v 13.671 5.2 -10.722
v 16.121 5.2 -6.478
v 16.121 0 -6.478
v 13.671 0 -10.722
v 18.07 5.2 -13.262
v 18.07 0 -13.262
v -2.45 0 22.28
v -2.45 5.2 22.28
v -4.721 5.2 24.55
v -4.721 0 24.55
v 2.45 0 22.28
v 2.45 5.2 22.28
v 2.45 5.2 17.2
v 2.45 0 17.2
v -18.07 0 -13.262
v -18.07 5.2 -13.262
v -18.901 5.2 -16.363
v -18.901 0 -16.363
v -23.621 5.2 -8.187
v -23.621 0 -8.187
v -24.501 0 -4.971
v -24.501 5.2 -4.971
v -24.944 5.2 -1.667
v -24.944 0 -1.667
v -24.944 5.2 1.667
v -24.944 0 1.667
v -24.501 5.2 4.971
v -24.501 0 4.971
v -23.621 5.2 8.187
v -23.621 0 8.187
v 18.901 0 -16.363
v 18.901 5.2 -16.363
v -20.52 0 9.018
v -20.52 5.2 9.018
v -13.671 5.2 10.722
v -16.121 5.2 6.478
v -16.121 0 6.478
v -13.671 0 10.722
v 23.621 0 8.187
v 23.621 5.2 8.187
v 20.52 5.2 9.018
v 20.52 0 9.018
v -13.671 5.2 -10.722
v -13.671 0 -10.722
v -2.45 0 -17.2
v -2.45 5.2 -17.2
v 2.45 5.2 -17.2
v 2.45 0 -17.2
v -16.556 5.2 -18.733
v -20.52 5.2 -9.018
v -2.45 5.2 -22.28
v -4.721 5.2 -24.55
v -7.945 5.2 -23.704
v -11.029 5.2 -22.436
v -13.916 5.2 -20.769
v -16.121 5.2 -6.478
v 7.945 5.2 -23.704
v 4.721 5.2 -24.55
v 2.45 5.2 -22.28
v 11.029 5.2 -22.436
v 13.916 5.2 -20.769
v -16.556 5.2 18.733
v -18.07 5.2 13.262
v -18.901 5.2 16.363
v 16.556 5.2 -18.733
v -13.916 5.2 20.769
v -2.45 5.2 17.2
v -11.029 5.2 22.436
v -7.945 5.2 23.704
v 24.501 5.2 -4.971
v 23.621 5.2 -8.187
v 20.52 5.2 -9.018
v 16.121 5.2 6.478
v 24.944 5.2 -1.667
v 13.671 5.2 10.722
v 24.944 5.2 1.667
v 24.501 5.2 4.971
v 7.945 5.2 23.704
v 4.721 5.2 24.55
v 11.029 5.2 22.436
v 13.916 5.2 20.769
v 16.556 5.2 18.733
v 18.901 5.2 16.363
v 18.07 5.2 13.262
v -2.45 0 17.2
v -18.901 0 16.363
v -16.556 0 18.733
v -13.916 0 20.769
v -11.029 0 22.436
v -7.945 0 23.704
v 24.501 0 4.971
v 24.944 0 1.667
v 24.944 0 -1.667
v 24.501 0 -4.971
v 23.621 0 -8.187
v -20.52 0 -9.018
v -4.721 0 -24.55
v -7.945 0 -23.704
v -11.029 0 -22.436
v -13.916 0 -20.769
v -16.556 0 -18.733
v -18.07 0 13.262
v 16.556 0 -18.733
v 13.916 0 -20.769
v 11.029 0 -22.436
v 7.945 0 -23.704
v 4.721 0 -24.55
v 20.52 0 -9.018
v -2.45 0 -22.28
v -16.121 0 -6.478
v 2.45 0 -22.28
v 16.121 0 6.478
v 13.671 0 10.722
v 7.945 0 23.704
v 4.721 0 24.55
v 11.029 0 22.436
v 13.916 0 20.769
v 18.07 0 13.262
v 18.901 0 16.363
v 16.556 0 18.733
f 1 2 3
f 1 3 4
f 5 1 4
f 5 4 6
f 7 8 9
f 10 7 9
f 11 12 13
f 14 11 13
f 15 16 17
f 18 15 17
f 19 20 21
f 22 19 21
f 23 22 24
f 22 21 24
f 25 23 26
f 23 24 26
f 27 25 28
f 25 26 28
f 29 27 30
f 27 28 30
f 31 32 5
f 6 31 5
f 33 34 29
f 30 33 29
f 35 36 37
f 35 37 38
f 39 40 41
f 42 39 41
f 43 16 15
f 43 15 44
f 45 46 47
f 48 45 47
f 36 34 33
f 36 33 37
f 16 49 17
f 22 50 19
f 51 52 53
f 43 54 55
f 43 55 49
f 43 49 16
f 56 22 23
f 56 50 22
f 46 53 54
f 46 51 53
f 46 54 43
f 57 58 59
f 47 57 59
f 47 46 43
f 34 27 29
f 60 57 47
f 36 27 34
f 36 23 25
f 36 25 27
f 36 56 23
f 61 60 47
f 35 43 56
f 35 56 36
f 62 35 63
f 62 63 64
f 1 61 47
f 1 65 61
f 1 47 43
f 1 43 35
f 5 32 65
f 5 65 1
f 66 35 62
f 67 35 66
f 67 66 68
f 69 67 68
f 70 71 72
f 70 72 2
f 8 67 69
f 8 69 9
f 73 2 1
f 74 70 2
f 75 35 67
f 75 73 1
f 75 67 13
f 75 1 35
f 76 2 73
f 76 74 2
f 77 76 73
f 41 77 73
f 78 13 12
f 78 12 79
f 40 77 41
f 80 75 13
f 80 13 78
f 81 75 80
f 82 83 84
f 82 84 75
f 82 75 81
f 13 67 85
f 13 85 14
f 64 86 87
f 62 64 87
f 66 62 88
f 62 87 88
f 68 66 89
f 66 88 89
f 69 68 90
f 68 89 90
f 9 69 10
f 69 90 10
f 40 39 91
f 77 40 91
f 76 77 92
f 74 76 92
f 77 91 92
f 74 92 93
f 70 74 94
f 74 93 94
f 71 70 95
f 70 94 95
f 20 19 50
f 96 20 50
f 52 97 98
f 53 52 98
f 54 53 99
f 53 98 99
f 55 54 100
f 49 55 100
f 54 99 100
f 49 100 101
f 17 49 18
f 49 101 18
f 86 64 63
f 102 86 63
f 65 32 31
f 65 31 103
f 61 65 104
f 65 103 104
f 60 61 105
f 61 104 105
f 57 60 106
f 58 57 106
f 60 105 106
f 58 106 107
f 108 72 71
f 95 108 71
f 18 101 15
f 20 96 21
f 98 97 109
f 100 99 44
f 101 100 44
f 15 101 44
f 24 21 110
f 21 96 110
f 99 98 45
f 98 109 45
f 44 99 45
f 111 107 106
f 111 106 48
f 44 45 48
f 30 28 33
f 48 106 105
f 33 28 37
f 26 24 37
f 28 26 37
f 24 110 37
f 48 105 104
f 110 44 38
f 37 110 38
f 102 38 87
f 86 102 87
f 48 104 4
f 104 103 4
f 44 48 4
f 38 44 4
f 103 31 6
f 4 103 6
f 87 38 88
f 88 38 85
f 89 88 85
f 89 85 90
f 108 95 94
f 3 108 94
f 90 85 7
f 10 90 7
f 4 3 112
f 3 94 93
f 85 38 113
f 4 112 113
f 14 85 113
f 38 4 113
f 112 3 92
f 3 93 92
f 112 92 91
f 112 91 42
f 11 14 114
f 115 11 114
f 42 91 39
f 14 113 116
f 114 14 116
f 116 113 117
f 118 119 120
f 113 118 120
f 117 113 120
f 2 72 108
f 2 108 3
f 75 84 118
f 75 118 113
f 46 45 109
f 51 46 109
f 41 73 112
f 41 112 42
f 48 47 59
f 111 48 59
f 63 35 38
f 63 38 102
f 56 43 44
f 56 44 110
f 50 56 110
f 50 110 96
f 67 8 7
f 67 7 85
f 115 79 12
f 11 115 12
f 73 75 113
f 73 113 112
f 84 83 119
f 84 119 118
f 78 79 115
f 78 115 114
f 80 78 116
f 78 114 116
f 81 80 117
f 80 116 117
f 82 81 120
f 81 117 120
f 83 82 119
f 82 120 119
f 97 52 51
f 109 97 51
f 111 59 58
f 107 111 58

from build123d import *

# Parameters (mm, degrees)
SKETCH1_R           = 25
BOSS_EXTRUDE1_DEPTH = 5.2
SKETCH2_W           = 4.9
SKETCH2_H           = 7.8
CUT_EXTRUDE1_DEPTH  = 5.2
CHAMFER1_SIZE       = 2.6


with BuildPart() as part:
    # Sketch1 → Boss-Extrude1 (new body)
    with BuildSketch(Plane(origin=(0, 0, 0), x_dir=(1, 0, 0), z_dir=(0, 1, 0))):
        with Locations(Location((0, 0, 0), (0, 0, 270))):
            Circle(SKETCH1_R)
    extrude(amount=BOSS_EXTRUDE1_DEPTH)

    # Sketch2 → Cut-Extrude1 (cut)
    with BuildSketch(Plane(origin=(0, 5.2, 0), x_dir=(1, 0, 0), z_dir=(0, 1, 0))):
        Polygon((22.875635095, 10.378237761), (16.120636945, 6.478237761), (13.670636945, 10.721762239), (20.425635095, 14.621762239), align=None)
        with Locations((0, 21.1)):
            Rectangle(SKETCH2_W, SKETCH2_H)
        Polygon((20.425635095, -14.621762239), (13.670636945, -10.721762239), (16.120636945, -6.478237761), (22.875635095, -10.378237761), align=None)
        with Locations((0, -21.1)):
            Rectangle(SKETCH2_W, SKETCH2_H)
        Polygon((-22.875635095, -10.378237761), (-16.120636945, -6.478237761), (-13.670636945, -10.721762239), (-20.425635095, -14.621762239), align=None)
        Polygon((-20.425635095, 14.621762239), (-13.670636945, 10.721762239), (-16.120636945, 6.478237761), (-22.875635095, 10.378237761), align=None)
    extrude(amount=-CUT_EXTRUDE1_DEPTH, mode=Mode.SUBTRACT)

    # Chamfer1
    # the kernel refuses this chamfer: 2.6, 2.378368378 mm, written as the material it takes off along each edge
    with BuildSketch(Plane(origin=(20.321417916, 11.886375769, -14.561592423), x_dir=(-0.6191501526996462, 0, -0.7852726204395546), z_dir=(0, -1, 0)), Plane(origin=(-2.45, 11.886375769, -24.879660367), x_dir=(-0.9896411145468598, 0, 0.14356345077508154), z_dir=(0, -1, 0)), Plane(origin=(-22.771417916, 11.886375769, -10.318067944), x_dir=(-0.37049096184717384, 0, 0.9288360712146981), z_dir=(0, -1, 0)), Plane(origin=(-20.321417916, 11.886375769, 14.561592423), x_dir=(0.6191501526997778, 0, 0.785272620439451), z_dir=(0, -1, 0)), Plane(origin=(2.45, 11.886375769, 24.879660367), x_dir=(0.9896411145468216, 0, -0.14356345077534402), z_dir=(0, -1, 0)), Plane(origin=(22.771417916, 11.886375769, 10.318067944), x_dir=(0.3704909618470835, 0, -0.9288360712147342), z_dir=(0, -1, 0))) as chamfer1_piece_1:
        with BuildLine():
            Line((2.294378332, 0), (CHAMFER1_SIZE * 0.143563450775, -CHAMFER1_SIZE * 0.989641114547))
            Line((CHAMFER1_SIZE * 0.143563450775, -CHAMFER1_SIZE * 0.989641114547), (0, 0))
            ThreePointArc((0, 0), (1.178279971, 0.026315397), (2.294378332, 0))
        make_face()
    extrude(amount=18.572751537, mode=Mode.SUBTRACT)
    with BuildSketch(Plane(origin=(22.771417916, 11.886375769, -10.318067944), x_dir=(-0.8660254037844386, 0, 0.49999999999999983), z_dir=(0, -1, 0)), Plane(origin=(2.45, 11.886375769, -24.879660367), x_dir=(0, 0, 1), z_dir=(0, -1, 0)), Plane(origin=(-20.321417916, 11.886375769, -14.561592423), x_dir=(0.8660254037844397, 0, 0.4999999999999983), z_dir=(0, -1, 0)), Plane(origin=(-22.771417916, 11.886375769, 10.318067944), x_dir=(0.8660254037844377, 0, -0.5000000000000014), z_dir=(0, -1, 0)), Plane(origin=(-2.45, 11.886375769, 24.879660367), x_dir=(0, 0, -1), z_dir=(0, -1, 0))) as chamfer1_piece_2:
        with BuildLine():
            Line((CHAMFER1_SIZE, 0), (0.329388871, -2.270611129))
            ThreePointArc((0.329388871, -2.270611129), (0.14311514, -1.169852233), (0, 0))
            Line((0, 0), (CHAMFER1_SIZE, 0))
        make_face()
    extrude(amount=18.572751537, mode=Mode.SUBTRACT)
    with BuildSketch(Plane(origin=(20.321417916, 11.886375769, 14.561592423), x_dir=(-0.6191501526994649, 0, 0.7852726204396976), z_dir=(0, -1, 0))) as chamfer1_piece_3:
        with BuildLine():
            Line((2.294378332, 0), (CHAMFER1_SIZE * 0.143563450775, CHAMFER1_SIZE * 0.989641114547))
            Line((CHAMFER1_SIZE * 0.143563450775, CHAMFER1_SIZE * 0.989641114547), (0, 0))
            ThreePointArc((0, 0), (1.178279971, -0.026315397), (2.294378332, 0))
        make_face()
    extrude(amount=18.572751537, mode=Mode.SUBTRACT)


solid = part.part
